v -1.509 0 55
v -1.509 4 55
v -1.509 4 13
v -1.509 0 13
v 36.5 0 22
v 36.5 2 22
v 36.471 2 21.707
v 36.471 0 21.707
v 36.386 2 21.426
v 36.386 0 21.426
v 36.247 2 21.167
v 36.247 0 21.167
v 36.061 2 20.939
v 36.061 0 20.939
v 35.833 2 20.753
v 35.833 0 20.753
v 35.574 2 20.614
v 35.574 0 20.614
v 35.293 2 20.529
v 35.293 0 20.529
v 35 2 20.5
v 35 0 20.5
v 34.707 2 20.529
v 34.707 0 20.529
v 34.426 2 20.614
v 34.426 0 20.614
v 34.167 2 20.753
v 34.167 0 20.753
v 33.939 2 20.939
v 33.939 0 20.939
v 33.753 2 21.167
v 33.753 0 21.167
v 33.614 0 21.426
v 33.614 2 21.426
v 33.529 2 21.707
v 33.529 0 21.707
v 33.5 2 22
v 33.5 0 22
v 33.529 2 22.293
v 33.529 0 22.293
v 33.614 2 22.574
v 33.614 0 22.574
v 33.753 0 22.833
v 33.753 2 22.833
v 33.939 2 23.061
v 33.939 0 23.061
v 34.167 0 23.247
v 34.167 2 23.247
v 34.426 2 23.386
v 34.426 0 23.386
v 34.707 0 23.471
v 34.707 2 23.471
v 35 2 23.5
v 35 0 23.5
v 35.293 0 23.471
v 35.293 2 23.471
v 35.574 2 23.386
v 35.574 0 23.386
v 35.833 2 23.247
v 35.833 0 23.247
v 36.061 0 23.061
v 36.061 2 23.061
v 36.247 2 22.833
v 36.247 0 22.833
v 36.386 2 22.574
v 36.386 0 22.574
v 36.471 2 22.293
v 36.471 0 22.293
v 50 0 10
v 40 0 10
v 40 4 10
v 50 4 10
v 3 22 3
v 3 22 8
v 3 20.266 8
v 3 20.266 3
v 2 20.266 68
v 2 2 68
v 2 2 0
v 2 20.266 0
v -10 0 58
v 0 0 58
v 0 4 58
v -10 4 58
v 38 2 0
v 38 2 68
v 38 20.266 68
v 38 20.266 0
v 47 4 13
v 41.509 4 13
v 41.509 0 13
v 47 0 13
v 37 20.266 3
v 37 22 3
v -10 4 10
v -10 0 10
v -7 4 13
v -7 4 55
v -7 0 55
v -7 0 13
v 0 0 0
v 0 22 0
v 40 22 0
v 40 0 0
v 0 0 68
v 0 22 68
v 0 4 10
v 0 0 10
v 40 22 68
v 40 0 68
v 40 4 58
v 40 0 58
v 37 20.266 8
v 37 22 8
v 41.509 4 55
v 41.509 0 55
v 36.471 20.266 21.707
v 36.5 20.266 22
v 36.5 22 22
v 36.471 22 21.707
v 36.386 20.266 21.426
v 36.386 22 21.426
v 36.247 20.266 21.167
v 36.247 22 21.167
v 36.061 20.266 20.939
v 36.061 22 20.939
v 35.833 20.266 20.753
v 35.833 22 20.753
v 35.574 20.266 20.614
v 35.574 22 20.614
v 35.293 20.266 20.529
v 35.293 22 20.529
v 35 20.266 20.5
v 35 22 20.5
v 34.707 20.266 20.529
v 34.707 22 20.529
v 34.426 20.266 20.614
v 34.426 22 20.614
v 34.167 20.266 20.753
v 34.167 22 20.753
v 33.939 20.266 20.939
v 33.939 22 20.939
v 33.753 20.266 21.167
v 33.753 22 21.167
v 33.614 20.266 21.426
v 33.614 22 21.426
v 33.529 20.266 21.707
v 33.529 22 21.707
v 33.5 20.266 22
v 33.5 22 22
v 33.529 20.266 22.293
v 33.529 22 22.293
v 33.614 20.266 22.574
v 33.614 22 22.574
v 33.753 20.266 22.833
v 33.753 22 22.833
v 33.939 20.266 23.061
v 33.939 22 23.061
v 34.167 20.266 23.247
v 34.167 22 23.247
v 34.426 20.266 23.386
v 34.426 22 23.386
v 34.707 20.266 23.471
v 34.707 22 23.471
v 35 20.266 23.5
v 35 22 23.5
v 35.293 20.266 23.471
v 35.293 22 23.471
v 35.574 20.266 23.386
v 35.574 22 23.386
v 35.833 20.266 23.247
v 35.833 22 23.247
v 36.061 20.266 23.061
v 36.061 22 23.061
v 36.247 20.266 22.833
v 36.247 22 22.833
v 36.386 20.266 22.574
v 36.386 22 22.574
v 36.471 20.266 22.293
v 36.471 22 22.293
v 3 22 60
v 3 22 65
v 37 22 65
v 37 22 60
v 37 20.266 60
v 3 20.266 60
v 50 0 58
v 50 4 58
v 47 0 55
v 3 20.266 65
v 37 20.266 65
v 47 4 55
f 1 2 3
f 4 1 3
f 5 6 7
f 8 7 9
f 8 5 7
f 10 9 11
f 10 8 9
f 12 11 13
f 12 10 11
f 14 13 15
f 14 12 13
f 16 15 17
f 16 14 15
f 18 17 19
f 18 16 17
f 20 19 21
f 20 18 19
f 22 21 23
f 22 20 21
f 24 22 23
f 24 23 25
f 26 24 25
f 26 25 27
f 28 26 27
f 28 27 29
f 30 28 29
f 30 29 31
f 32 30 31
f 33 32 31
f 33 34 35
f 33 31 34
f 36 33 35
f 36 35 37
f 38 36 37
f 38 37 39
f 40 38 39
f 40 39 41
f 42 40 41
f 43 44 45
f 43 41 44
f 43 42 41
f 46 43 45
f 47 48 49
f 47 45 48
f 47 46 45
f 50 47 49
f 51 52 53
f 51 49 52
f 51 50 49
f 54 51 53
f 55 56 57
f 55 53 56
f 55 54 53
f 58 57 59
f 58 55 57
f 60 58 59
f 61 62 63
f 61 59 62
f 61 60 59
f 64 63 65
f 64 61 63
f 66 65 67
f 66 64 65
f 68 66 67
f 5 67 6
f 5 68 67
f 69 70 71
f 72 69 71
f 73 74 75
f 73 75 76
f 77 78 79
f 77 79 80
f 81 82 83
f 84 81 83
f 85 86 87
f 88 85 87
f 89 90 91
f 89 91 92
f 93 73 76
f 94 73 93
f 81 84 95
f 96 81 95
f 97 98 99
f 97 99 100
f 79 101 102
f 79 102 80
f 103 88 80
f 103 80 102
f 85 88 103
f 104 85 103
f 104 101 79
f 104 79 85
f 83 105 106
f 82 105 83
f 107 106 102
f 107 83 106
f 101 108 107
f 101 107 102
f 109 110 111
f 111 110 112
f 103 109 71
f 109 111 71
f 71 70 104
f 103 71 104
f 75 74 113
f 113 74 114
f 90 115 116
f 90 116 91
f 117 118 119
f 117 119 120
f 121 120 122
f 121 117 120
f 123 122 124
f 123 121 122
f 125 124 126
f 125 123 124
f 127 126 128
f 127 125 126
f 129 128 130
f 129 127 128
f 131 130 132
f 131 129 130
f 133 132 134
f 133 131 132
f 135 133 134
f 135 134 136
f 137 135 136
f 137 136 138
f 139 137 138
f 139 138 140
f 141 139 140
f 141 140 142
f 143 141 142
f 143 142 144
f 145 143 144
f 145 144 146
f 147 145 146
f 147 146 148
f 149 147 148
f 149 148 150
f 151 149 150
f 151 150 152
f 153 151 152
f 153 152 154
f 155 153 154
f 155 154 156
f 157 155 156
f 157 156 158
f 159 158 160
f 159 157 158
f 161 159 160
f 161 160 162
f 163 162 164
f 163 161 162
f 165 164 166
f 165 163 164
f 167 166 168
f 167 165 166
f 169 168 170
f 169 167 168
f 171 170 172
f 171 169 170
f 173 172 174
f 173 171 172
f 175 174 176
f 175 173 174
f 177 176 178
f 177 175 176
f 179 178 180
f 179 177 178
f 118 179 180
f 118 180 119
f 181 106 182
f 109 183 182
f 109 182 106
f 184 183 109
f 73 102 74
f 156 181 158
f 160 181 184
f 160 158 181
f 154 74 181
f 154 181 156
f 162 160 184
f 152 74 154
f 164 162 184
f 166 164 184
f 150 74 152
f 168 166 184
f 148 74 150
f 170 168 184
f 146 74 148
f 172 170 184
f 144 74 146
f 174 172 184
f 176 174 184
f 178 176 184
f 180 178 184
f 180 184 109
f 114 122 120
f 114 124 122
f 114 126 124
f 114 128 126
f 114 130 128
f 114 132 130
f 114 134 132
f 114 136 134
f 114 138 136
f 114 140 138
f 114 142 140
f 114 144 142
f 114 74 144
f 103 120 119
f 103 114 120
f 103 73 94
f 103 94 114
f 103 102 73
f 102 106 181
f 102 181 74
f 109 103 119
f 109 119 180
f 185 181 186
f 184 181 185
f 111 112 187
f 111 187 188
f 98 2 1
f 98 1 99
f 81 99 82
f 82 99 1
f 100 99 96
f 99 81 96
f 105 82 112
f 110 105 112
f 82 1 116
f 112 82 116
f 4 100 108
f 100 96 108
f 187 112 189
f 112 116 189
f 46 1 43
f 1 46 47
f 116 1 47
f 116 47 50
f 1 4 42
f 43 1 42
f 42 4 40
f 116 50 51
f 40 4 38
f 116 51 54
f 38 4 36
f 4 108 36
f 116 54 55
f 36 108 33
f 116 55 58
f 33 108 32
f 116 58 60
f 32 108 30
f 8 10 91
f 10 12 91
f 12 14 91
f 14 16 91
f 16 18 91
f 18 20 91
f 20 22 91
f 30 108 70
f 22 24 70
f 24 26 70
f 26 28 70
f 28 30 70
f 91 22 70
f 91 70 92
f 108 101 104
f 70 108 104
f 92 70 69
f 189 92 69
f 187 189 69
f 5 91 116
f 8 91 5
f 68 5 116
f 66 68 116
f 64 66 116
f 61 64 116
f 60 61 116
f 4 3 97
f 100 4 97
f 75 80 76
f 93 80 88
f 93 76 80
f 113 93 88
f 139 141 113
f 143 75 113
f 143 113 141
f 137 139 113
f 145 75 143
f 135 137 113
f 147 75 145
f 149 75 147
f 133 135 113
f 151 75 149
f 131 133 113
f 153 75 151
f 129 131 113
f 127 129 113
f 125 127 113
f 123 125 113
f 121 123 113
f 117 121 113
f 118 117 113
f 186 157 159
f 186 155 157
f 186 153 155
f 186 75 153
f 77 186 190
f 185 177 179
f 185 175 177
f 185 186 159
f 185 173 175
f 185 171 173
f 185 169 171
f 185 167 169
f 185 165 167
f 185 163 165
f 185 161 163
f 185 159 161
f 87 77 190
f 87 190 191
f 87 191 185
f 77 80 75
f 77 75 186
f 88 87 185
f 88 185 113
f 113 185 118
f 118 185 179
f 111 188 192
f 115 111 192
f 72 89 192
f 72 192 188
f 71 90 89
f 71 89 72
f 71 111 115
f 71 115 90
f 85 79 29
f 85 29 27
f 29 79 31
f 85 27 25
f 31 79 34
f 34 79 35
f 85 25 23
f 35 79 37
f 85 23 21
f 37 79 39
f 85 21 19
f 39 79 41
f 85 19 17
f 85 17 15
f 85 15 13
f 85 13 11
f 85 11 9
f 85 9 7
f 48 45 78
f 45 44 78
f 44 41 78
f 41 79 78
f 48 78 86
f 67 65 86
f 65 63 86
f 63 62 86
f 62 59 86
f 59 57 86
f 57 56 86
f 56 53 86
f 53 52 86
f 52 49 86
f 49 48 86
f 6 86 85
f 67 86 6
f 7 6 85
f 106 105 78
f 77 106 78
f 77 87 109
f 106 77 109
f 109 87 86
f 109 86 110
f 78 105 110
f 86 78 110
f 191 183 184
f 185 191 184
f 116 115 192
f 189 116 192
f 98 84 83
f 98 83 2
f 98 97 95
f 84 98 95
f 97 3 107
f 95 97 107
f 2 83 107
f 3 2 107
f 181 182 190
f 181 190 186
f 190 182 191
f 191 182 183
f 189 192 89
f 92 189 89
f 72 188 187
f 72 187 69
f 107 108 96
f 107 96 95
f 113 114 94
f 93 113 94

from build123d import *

# Parameters (mm, degrees)
SKETCH1_W           = 40
SKETCH1_H           = 68
SKETCH1_R           = 1.5
BOSS_EXTRUDE1_DEPTH = 22
SKETCH2_W           = 36
SKETCH2_H           = 18.265871498
CUT_EXTRUDE1_DEPTH  = 69
SKETCH3_W           = 34
SKETCH3_H           = 5
CUT_EXTRUDE2_DEPTH  = 2
SKETCH6_W           = 48
SKETCH6_H           = 4
BOSS_EXTRUDE3_DEPTH = 10
SKETCH7_W           = 5.490890851
SKETCH7_H           = 42
CUT_EXTRUDE4_DEPTH  = 10


with BuildPart() as part:
    # Sketch1 → Boss-Extrude1 (new body)
    with BuildSketch(Plane(origin=(0, 0, 0), x_dir=(1, 0, 0), z_dir=(0, 1, 0))):
        with Locations((20, -34)):
            Rectangle(SKETCH1_W, SKETCH1_H)
        with Locations((35, -22)):
            Circle(SKETCH1_R, mode=Mode.SUBTRACT)
    extrude(amount=BOSS_EXTRUDE1_DEPTH)

    # Sketch2 → Cut-Extrude1 (cut, through all)
    with BuildSketch(Plane.XY.offset(68)):
        with Locations((20, 11.132935749)):
            Rectangle(SKETCH2_W, SKETCH2_H)
    extrude(amount=-CUT_EXTRUDE1_DEPTH, mode=Mode.SUBTRACT)

    # Sketch3 → Cut-Extrude2 (cut)
    with BuildSketch(Plane(origin=(0, 22, 0), x_dir=(1, 0, 0), z_dir=(0, 1, 0))):
        with Locations((20, -62.5)):
            Rectangle(SKETCH3_W, SKETCH3_H)
        with Locations((20, -5.5)):
            Rectangle(SKETCH3_W, SKETCH3_H)
    extrude(amount=-CUT_EXTRUDE2_DEPTH, mode=Mode.SUBTRACT)

    # Sketch6 → Boss-Extrude3 (add)
    with BuildSketch(Plane(origin=(40, 0, 0), x_dir=(0, 0, -1), z_dir=(1, 0, 0))):
        with Locations((-34, 2)):
            Rectangle(SKETCH6_W, SKETCH6_H)
    boss_extrude3 = extrude(amount=BOSS_EXTRUDE3_DEPTH)

    # Sketch7 → Cut-Extrude4 (cut)
    with BuildSketch(Plane(origin=(0, 4, 0), x_dir=(1, 0, 0), z_dir=(0, 1, 0))):
        with Locations((44.254554575, -34)):
            Rectangle(SKETCH7_W, SKETCH7_H)
    cut_extrude4 = extrude(amount=-CUT_EXTRUDE4_DEPTH, mode=Mode.SUBTRACT)

    # Mirror1: Boss-Extrude3 across plane
    add(boss_extrude3.mirror(Plane(origin=(20, 0, 0), x_dir=(0, 0, 1), z_dir=(1, 0, 0))))

    # Mirror2: Cut-Extrude4 across plane
    add(cut_extrude4.mirror(Plane(origin=(20, 0, 0), x_dir=(0, 0, 1), z_dir=(1, 0, 0))), mode=Mode.SUBTRACT)


solid = part.part
